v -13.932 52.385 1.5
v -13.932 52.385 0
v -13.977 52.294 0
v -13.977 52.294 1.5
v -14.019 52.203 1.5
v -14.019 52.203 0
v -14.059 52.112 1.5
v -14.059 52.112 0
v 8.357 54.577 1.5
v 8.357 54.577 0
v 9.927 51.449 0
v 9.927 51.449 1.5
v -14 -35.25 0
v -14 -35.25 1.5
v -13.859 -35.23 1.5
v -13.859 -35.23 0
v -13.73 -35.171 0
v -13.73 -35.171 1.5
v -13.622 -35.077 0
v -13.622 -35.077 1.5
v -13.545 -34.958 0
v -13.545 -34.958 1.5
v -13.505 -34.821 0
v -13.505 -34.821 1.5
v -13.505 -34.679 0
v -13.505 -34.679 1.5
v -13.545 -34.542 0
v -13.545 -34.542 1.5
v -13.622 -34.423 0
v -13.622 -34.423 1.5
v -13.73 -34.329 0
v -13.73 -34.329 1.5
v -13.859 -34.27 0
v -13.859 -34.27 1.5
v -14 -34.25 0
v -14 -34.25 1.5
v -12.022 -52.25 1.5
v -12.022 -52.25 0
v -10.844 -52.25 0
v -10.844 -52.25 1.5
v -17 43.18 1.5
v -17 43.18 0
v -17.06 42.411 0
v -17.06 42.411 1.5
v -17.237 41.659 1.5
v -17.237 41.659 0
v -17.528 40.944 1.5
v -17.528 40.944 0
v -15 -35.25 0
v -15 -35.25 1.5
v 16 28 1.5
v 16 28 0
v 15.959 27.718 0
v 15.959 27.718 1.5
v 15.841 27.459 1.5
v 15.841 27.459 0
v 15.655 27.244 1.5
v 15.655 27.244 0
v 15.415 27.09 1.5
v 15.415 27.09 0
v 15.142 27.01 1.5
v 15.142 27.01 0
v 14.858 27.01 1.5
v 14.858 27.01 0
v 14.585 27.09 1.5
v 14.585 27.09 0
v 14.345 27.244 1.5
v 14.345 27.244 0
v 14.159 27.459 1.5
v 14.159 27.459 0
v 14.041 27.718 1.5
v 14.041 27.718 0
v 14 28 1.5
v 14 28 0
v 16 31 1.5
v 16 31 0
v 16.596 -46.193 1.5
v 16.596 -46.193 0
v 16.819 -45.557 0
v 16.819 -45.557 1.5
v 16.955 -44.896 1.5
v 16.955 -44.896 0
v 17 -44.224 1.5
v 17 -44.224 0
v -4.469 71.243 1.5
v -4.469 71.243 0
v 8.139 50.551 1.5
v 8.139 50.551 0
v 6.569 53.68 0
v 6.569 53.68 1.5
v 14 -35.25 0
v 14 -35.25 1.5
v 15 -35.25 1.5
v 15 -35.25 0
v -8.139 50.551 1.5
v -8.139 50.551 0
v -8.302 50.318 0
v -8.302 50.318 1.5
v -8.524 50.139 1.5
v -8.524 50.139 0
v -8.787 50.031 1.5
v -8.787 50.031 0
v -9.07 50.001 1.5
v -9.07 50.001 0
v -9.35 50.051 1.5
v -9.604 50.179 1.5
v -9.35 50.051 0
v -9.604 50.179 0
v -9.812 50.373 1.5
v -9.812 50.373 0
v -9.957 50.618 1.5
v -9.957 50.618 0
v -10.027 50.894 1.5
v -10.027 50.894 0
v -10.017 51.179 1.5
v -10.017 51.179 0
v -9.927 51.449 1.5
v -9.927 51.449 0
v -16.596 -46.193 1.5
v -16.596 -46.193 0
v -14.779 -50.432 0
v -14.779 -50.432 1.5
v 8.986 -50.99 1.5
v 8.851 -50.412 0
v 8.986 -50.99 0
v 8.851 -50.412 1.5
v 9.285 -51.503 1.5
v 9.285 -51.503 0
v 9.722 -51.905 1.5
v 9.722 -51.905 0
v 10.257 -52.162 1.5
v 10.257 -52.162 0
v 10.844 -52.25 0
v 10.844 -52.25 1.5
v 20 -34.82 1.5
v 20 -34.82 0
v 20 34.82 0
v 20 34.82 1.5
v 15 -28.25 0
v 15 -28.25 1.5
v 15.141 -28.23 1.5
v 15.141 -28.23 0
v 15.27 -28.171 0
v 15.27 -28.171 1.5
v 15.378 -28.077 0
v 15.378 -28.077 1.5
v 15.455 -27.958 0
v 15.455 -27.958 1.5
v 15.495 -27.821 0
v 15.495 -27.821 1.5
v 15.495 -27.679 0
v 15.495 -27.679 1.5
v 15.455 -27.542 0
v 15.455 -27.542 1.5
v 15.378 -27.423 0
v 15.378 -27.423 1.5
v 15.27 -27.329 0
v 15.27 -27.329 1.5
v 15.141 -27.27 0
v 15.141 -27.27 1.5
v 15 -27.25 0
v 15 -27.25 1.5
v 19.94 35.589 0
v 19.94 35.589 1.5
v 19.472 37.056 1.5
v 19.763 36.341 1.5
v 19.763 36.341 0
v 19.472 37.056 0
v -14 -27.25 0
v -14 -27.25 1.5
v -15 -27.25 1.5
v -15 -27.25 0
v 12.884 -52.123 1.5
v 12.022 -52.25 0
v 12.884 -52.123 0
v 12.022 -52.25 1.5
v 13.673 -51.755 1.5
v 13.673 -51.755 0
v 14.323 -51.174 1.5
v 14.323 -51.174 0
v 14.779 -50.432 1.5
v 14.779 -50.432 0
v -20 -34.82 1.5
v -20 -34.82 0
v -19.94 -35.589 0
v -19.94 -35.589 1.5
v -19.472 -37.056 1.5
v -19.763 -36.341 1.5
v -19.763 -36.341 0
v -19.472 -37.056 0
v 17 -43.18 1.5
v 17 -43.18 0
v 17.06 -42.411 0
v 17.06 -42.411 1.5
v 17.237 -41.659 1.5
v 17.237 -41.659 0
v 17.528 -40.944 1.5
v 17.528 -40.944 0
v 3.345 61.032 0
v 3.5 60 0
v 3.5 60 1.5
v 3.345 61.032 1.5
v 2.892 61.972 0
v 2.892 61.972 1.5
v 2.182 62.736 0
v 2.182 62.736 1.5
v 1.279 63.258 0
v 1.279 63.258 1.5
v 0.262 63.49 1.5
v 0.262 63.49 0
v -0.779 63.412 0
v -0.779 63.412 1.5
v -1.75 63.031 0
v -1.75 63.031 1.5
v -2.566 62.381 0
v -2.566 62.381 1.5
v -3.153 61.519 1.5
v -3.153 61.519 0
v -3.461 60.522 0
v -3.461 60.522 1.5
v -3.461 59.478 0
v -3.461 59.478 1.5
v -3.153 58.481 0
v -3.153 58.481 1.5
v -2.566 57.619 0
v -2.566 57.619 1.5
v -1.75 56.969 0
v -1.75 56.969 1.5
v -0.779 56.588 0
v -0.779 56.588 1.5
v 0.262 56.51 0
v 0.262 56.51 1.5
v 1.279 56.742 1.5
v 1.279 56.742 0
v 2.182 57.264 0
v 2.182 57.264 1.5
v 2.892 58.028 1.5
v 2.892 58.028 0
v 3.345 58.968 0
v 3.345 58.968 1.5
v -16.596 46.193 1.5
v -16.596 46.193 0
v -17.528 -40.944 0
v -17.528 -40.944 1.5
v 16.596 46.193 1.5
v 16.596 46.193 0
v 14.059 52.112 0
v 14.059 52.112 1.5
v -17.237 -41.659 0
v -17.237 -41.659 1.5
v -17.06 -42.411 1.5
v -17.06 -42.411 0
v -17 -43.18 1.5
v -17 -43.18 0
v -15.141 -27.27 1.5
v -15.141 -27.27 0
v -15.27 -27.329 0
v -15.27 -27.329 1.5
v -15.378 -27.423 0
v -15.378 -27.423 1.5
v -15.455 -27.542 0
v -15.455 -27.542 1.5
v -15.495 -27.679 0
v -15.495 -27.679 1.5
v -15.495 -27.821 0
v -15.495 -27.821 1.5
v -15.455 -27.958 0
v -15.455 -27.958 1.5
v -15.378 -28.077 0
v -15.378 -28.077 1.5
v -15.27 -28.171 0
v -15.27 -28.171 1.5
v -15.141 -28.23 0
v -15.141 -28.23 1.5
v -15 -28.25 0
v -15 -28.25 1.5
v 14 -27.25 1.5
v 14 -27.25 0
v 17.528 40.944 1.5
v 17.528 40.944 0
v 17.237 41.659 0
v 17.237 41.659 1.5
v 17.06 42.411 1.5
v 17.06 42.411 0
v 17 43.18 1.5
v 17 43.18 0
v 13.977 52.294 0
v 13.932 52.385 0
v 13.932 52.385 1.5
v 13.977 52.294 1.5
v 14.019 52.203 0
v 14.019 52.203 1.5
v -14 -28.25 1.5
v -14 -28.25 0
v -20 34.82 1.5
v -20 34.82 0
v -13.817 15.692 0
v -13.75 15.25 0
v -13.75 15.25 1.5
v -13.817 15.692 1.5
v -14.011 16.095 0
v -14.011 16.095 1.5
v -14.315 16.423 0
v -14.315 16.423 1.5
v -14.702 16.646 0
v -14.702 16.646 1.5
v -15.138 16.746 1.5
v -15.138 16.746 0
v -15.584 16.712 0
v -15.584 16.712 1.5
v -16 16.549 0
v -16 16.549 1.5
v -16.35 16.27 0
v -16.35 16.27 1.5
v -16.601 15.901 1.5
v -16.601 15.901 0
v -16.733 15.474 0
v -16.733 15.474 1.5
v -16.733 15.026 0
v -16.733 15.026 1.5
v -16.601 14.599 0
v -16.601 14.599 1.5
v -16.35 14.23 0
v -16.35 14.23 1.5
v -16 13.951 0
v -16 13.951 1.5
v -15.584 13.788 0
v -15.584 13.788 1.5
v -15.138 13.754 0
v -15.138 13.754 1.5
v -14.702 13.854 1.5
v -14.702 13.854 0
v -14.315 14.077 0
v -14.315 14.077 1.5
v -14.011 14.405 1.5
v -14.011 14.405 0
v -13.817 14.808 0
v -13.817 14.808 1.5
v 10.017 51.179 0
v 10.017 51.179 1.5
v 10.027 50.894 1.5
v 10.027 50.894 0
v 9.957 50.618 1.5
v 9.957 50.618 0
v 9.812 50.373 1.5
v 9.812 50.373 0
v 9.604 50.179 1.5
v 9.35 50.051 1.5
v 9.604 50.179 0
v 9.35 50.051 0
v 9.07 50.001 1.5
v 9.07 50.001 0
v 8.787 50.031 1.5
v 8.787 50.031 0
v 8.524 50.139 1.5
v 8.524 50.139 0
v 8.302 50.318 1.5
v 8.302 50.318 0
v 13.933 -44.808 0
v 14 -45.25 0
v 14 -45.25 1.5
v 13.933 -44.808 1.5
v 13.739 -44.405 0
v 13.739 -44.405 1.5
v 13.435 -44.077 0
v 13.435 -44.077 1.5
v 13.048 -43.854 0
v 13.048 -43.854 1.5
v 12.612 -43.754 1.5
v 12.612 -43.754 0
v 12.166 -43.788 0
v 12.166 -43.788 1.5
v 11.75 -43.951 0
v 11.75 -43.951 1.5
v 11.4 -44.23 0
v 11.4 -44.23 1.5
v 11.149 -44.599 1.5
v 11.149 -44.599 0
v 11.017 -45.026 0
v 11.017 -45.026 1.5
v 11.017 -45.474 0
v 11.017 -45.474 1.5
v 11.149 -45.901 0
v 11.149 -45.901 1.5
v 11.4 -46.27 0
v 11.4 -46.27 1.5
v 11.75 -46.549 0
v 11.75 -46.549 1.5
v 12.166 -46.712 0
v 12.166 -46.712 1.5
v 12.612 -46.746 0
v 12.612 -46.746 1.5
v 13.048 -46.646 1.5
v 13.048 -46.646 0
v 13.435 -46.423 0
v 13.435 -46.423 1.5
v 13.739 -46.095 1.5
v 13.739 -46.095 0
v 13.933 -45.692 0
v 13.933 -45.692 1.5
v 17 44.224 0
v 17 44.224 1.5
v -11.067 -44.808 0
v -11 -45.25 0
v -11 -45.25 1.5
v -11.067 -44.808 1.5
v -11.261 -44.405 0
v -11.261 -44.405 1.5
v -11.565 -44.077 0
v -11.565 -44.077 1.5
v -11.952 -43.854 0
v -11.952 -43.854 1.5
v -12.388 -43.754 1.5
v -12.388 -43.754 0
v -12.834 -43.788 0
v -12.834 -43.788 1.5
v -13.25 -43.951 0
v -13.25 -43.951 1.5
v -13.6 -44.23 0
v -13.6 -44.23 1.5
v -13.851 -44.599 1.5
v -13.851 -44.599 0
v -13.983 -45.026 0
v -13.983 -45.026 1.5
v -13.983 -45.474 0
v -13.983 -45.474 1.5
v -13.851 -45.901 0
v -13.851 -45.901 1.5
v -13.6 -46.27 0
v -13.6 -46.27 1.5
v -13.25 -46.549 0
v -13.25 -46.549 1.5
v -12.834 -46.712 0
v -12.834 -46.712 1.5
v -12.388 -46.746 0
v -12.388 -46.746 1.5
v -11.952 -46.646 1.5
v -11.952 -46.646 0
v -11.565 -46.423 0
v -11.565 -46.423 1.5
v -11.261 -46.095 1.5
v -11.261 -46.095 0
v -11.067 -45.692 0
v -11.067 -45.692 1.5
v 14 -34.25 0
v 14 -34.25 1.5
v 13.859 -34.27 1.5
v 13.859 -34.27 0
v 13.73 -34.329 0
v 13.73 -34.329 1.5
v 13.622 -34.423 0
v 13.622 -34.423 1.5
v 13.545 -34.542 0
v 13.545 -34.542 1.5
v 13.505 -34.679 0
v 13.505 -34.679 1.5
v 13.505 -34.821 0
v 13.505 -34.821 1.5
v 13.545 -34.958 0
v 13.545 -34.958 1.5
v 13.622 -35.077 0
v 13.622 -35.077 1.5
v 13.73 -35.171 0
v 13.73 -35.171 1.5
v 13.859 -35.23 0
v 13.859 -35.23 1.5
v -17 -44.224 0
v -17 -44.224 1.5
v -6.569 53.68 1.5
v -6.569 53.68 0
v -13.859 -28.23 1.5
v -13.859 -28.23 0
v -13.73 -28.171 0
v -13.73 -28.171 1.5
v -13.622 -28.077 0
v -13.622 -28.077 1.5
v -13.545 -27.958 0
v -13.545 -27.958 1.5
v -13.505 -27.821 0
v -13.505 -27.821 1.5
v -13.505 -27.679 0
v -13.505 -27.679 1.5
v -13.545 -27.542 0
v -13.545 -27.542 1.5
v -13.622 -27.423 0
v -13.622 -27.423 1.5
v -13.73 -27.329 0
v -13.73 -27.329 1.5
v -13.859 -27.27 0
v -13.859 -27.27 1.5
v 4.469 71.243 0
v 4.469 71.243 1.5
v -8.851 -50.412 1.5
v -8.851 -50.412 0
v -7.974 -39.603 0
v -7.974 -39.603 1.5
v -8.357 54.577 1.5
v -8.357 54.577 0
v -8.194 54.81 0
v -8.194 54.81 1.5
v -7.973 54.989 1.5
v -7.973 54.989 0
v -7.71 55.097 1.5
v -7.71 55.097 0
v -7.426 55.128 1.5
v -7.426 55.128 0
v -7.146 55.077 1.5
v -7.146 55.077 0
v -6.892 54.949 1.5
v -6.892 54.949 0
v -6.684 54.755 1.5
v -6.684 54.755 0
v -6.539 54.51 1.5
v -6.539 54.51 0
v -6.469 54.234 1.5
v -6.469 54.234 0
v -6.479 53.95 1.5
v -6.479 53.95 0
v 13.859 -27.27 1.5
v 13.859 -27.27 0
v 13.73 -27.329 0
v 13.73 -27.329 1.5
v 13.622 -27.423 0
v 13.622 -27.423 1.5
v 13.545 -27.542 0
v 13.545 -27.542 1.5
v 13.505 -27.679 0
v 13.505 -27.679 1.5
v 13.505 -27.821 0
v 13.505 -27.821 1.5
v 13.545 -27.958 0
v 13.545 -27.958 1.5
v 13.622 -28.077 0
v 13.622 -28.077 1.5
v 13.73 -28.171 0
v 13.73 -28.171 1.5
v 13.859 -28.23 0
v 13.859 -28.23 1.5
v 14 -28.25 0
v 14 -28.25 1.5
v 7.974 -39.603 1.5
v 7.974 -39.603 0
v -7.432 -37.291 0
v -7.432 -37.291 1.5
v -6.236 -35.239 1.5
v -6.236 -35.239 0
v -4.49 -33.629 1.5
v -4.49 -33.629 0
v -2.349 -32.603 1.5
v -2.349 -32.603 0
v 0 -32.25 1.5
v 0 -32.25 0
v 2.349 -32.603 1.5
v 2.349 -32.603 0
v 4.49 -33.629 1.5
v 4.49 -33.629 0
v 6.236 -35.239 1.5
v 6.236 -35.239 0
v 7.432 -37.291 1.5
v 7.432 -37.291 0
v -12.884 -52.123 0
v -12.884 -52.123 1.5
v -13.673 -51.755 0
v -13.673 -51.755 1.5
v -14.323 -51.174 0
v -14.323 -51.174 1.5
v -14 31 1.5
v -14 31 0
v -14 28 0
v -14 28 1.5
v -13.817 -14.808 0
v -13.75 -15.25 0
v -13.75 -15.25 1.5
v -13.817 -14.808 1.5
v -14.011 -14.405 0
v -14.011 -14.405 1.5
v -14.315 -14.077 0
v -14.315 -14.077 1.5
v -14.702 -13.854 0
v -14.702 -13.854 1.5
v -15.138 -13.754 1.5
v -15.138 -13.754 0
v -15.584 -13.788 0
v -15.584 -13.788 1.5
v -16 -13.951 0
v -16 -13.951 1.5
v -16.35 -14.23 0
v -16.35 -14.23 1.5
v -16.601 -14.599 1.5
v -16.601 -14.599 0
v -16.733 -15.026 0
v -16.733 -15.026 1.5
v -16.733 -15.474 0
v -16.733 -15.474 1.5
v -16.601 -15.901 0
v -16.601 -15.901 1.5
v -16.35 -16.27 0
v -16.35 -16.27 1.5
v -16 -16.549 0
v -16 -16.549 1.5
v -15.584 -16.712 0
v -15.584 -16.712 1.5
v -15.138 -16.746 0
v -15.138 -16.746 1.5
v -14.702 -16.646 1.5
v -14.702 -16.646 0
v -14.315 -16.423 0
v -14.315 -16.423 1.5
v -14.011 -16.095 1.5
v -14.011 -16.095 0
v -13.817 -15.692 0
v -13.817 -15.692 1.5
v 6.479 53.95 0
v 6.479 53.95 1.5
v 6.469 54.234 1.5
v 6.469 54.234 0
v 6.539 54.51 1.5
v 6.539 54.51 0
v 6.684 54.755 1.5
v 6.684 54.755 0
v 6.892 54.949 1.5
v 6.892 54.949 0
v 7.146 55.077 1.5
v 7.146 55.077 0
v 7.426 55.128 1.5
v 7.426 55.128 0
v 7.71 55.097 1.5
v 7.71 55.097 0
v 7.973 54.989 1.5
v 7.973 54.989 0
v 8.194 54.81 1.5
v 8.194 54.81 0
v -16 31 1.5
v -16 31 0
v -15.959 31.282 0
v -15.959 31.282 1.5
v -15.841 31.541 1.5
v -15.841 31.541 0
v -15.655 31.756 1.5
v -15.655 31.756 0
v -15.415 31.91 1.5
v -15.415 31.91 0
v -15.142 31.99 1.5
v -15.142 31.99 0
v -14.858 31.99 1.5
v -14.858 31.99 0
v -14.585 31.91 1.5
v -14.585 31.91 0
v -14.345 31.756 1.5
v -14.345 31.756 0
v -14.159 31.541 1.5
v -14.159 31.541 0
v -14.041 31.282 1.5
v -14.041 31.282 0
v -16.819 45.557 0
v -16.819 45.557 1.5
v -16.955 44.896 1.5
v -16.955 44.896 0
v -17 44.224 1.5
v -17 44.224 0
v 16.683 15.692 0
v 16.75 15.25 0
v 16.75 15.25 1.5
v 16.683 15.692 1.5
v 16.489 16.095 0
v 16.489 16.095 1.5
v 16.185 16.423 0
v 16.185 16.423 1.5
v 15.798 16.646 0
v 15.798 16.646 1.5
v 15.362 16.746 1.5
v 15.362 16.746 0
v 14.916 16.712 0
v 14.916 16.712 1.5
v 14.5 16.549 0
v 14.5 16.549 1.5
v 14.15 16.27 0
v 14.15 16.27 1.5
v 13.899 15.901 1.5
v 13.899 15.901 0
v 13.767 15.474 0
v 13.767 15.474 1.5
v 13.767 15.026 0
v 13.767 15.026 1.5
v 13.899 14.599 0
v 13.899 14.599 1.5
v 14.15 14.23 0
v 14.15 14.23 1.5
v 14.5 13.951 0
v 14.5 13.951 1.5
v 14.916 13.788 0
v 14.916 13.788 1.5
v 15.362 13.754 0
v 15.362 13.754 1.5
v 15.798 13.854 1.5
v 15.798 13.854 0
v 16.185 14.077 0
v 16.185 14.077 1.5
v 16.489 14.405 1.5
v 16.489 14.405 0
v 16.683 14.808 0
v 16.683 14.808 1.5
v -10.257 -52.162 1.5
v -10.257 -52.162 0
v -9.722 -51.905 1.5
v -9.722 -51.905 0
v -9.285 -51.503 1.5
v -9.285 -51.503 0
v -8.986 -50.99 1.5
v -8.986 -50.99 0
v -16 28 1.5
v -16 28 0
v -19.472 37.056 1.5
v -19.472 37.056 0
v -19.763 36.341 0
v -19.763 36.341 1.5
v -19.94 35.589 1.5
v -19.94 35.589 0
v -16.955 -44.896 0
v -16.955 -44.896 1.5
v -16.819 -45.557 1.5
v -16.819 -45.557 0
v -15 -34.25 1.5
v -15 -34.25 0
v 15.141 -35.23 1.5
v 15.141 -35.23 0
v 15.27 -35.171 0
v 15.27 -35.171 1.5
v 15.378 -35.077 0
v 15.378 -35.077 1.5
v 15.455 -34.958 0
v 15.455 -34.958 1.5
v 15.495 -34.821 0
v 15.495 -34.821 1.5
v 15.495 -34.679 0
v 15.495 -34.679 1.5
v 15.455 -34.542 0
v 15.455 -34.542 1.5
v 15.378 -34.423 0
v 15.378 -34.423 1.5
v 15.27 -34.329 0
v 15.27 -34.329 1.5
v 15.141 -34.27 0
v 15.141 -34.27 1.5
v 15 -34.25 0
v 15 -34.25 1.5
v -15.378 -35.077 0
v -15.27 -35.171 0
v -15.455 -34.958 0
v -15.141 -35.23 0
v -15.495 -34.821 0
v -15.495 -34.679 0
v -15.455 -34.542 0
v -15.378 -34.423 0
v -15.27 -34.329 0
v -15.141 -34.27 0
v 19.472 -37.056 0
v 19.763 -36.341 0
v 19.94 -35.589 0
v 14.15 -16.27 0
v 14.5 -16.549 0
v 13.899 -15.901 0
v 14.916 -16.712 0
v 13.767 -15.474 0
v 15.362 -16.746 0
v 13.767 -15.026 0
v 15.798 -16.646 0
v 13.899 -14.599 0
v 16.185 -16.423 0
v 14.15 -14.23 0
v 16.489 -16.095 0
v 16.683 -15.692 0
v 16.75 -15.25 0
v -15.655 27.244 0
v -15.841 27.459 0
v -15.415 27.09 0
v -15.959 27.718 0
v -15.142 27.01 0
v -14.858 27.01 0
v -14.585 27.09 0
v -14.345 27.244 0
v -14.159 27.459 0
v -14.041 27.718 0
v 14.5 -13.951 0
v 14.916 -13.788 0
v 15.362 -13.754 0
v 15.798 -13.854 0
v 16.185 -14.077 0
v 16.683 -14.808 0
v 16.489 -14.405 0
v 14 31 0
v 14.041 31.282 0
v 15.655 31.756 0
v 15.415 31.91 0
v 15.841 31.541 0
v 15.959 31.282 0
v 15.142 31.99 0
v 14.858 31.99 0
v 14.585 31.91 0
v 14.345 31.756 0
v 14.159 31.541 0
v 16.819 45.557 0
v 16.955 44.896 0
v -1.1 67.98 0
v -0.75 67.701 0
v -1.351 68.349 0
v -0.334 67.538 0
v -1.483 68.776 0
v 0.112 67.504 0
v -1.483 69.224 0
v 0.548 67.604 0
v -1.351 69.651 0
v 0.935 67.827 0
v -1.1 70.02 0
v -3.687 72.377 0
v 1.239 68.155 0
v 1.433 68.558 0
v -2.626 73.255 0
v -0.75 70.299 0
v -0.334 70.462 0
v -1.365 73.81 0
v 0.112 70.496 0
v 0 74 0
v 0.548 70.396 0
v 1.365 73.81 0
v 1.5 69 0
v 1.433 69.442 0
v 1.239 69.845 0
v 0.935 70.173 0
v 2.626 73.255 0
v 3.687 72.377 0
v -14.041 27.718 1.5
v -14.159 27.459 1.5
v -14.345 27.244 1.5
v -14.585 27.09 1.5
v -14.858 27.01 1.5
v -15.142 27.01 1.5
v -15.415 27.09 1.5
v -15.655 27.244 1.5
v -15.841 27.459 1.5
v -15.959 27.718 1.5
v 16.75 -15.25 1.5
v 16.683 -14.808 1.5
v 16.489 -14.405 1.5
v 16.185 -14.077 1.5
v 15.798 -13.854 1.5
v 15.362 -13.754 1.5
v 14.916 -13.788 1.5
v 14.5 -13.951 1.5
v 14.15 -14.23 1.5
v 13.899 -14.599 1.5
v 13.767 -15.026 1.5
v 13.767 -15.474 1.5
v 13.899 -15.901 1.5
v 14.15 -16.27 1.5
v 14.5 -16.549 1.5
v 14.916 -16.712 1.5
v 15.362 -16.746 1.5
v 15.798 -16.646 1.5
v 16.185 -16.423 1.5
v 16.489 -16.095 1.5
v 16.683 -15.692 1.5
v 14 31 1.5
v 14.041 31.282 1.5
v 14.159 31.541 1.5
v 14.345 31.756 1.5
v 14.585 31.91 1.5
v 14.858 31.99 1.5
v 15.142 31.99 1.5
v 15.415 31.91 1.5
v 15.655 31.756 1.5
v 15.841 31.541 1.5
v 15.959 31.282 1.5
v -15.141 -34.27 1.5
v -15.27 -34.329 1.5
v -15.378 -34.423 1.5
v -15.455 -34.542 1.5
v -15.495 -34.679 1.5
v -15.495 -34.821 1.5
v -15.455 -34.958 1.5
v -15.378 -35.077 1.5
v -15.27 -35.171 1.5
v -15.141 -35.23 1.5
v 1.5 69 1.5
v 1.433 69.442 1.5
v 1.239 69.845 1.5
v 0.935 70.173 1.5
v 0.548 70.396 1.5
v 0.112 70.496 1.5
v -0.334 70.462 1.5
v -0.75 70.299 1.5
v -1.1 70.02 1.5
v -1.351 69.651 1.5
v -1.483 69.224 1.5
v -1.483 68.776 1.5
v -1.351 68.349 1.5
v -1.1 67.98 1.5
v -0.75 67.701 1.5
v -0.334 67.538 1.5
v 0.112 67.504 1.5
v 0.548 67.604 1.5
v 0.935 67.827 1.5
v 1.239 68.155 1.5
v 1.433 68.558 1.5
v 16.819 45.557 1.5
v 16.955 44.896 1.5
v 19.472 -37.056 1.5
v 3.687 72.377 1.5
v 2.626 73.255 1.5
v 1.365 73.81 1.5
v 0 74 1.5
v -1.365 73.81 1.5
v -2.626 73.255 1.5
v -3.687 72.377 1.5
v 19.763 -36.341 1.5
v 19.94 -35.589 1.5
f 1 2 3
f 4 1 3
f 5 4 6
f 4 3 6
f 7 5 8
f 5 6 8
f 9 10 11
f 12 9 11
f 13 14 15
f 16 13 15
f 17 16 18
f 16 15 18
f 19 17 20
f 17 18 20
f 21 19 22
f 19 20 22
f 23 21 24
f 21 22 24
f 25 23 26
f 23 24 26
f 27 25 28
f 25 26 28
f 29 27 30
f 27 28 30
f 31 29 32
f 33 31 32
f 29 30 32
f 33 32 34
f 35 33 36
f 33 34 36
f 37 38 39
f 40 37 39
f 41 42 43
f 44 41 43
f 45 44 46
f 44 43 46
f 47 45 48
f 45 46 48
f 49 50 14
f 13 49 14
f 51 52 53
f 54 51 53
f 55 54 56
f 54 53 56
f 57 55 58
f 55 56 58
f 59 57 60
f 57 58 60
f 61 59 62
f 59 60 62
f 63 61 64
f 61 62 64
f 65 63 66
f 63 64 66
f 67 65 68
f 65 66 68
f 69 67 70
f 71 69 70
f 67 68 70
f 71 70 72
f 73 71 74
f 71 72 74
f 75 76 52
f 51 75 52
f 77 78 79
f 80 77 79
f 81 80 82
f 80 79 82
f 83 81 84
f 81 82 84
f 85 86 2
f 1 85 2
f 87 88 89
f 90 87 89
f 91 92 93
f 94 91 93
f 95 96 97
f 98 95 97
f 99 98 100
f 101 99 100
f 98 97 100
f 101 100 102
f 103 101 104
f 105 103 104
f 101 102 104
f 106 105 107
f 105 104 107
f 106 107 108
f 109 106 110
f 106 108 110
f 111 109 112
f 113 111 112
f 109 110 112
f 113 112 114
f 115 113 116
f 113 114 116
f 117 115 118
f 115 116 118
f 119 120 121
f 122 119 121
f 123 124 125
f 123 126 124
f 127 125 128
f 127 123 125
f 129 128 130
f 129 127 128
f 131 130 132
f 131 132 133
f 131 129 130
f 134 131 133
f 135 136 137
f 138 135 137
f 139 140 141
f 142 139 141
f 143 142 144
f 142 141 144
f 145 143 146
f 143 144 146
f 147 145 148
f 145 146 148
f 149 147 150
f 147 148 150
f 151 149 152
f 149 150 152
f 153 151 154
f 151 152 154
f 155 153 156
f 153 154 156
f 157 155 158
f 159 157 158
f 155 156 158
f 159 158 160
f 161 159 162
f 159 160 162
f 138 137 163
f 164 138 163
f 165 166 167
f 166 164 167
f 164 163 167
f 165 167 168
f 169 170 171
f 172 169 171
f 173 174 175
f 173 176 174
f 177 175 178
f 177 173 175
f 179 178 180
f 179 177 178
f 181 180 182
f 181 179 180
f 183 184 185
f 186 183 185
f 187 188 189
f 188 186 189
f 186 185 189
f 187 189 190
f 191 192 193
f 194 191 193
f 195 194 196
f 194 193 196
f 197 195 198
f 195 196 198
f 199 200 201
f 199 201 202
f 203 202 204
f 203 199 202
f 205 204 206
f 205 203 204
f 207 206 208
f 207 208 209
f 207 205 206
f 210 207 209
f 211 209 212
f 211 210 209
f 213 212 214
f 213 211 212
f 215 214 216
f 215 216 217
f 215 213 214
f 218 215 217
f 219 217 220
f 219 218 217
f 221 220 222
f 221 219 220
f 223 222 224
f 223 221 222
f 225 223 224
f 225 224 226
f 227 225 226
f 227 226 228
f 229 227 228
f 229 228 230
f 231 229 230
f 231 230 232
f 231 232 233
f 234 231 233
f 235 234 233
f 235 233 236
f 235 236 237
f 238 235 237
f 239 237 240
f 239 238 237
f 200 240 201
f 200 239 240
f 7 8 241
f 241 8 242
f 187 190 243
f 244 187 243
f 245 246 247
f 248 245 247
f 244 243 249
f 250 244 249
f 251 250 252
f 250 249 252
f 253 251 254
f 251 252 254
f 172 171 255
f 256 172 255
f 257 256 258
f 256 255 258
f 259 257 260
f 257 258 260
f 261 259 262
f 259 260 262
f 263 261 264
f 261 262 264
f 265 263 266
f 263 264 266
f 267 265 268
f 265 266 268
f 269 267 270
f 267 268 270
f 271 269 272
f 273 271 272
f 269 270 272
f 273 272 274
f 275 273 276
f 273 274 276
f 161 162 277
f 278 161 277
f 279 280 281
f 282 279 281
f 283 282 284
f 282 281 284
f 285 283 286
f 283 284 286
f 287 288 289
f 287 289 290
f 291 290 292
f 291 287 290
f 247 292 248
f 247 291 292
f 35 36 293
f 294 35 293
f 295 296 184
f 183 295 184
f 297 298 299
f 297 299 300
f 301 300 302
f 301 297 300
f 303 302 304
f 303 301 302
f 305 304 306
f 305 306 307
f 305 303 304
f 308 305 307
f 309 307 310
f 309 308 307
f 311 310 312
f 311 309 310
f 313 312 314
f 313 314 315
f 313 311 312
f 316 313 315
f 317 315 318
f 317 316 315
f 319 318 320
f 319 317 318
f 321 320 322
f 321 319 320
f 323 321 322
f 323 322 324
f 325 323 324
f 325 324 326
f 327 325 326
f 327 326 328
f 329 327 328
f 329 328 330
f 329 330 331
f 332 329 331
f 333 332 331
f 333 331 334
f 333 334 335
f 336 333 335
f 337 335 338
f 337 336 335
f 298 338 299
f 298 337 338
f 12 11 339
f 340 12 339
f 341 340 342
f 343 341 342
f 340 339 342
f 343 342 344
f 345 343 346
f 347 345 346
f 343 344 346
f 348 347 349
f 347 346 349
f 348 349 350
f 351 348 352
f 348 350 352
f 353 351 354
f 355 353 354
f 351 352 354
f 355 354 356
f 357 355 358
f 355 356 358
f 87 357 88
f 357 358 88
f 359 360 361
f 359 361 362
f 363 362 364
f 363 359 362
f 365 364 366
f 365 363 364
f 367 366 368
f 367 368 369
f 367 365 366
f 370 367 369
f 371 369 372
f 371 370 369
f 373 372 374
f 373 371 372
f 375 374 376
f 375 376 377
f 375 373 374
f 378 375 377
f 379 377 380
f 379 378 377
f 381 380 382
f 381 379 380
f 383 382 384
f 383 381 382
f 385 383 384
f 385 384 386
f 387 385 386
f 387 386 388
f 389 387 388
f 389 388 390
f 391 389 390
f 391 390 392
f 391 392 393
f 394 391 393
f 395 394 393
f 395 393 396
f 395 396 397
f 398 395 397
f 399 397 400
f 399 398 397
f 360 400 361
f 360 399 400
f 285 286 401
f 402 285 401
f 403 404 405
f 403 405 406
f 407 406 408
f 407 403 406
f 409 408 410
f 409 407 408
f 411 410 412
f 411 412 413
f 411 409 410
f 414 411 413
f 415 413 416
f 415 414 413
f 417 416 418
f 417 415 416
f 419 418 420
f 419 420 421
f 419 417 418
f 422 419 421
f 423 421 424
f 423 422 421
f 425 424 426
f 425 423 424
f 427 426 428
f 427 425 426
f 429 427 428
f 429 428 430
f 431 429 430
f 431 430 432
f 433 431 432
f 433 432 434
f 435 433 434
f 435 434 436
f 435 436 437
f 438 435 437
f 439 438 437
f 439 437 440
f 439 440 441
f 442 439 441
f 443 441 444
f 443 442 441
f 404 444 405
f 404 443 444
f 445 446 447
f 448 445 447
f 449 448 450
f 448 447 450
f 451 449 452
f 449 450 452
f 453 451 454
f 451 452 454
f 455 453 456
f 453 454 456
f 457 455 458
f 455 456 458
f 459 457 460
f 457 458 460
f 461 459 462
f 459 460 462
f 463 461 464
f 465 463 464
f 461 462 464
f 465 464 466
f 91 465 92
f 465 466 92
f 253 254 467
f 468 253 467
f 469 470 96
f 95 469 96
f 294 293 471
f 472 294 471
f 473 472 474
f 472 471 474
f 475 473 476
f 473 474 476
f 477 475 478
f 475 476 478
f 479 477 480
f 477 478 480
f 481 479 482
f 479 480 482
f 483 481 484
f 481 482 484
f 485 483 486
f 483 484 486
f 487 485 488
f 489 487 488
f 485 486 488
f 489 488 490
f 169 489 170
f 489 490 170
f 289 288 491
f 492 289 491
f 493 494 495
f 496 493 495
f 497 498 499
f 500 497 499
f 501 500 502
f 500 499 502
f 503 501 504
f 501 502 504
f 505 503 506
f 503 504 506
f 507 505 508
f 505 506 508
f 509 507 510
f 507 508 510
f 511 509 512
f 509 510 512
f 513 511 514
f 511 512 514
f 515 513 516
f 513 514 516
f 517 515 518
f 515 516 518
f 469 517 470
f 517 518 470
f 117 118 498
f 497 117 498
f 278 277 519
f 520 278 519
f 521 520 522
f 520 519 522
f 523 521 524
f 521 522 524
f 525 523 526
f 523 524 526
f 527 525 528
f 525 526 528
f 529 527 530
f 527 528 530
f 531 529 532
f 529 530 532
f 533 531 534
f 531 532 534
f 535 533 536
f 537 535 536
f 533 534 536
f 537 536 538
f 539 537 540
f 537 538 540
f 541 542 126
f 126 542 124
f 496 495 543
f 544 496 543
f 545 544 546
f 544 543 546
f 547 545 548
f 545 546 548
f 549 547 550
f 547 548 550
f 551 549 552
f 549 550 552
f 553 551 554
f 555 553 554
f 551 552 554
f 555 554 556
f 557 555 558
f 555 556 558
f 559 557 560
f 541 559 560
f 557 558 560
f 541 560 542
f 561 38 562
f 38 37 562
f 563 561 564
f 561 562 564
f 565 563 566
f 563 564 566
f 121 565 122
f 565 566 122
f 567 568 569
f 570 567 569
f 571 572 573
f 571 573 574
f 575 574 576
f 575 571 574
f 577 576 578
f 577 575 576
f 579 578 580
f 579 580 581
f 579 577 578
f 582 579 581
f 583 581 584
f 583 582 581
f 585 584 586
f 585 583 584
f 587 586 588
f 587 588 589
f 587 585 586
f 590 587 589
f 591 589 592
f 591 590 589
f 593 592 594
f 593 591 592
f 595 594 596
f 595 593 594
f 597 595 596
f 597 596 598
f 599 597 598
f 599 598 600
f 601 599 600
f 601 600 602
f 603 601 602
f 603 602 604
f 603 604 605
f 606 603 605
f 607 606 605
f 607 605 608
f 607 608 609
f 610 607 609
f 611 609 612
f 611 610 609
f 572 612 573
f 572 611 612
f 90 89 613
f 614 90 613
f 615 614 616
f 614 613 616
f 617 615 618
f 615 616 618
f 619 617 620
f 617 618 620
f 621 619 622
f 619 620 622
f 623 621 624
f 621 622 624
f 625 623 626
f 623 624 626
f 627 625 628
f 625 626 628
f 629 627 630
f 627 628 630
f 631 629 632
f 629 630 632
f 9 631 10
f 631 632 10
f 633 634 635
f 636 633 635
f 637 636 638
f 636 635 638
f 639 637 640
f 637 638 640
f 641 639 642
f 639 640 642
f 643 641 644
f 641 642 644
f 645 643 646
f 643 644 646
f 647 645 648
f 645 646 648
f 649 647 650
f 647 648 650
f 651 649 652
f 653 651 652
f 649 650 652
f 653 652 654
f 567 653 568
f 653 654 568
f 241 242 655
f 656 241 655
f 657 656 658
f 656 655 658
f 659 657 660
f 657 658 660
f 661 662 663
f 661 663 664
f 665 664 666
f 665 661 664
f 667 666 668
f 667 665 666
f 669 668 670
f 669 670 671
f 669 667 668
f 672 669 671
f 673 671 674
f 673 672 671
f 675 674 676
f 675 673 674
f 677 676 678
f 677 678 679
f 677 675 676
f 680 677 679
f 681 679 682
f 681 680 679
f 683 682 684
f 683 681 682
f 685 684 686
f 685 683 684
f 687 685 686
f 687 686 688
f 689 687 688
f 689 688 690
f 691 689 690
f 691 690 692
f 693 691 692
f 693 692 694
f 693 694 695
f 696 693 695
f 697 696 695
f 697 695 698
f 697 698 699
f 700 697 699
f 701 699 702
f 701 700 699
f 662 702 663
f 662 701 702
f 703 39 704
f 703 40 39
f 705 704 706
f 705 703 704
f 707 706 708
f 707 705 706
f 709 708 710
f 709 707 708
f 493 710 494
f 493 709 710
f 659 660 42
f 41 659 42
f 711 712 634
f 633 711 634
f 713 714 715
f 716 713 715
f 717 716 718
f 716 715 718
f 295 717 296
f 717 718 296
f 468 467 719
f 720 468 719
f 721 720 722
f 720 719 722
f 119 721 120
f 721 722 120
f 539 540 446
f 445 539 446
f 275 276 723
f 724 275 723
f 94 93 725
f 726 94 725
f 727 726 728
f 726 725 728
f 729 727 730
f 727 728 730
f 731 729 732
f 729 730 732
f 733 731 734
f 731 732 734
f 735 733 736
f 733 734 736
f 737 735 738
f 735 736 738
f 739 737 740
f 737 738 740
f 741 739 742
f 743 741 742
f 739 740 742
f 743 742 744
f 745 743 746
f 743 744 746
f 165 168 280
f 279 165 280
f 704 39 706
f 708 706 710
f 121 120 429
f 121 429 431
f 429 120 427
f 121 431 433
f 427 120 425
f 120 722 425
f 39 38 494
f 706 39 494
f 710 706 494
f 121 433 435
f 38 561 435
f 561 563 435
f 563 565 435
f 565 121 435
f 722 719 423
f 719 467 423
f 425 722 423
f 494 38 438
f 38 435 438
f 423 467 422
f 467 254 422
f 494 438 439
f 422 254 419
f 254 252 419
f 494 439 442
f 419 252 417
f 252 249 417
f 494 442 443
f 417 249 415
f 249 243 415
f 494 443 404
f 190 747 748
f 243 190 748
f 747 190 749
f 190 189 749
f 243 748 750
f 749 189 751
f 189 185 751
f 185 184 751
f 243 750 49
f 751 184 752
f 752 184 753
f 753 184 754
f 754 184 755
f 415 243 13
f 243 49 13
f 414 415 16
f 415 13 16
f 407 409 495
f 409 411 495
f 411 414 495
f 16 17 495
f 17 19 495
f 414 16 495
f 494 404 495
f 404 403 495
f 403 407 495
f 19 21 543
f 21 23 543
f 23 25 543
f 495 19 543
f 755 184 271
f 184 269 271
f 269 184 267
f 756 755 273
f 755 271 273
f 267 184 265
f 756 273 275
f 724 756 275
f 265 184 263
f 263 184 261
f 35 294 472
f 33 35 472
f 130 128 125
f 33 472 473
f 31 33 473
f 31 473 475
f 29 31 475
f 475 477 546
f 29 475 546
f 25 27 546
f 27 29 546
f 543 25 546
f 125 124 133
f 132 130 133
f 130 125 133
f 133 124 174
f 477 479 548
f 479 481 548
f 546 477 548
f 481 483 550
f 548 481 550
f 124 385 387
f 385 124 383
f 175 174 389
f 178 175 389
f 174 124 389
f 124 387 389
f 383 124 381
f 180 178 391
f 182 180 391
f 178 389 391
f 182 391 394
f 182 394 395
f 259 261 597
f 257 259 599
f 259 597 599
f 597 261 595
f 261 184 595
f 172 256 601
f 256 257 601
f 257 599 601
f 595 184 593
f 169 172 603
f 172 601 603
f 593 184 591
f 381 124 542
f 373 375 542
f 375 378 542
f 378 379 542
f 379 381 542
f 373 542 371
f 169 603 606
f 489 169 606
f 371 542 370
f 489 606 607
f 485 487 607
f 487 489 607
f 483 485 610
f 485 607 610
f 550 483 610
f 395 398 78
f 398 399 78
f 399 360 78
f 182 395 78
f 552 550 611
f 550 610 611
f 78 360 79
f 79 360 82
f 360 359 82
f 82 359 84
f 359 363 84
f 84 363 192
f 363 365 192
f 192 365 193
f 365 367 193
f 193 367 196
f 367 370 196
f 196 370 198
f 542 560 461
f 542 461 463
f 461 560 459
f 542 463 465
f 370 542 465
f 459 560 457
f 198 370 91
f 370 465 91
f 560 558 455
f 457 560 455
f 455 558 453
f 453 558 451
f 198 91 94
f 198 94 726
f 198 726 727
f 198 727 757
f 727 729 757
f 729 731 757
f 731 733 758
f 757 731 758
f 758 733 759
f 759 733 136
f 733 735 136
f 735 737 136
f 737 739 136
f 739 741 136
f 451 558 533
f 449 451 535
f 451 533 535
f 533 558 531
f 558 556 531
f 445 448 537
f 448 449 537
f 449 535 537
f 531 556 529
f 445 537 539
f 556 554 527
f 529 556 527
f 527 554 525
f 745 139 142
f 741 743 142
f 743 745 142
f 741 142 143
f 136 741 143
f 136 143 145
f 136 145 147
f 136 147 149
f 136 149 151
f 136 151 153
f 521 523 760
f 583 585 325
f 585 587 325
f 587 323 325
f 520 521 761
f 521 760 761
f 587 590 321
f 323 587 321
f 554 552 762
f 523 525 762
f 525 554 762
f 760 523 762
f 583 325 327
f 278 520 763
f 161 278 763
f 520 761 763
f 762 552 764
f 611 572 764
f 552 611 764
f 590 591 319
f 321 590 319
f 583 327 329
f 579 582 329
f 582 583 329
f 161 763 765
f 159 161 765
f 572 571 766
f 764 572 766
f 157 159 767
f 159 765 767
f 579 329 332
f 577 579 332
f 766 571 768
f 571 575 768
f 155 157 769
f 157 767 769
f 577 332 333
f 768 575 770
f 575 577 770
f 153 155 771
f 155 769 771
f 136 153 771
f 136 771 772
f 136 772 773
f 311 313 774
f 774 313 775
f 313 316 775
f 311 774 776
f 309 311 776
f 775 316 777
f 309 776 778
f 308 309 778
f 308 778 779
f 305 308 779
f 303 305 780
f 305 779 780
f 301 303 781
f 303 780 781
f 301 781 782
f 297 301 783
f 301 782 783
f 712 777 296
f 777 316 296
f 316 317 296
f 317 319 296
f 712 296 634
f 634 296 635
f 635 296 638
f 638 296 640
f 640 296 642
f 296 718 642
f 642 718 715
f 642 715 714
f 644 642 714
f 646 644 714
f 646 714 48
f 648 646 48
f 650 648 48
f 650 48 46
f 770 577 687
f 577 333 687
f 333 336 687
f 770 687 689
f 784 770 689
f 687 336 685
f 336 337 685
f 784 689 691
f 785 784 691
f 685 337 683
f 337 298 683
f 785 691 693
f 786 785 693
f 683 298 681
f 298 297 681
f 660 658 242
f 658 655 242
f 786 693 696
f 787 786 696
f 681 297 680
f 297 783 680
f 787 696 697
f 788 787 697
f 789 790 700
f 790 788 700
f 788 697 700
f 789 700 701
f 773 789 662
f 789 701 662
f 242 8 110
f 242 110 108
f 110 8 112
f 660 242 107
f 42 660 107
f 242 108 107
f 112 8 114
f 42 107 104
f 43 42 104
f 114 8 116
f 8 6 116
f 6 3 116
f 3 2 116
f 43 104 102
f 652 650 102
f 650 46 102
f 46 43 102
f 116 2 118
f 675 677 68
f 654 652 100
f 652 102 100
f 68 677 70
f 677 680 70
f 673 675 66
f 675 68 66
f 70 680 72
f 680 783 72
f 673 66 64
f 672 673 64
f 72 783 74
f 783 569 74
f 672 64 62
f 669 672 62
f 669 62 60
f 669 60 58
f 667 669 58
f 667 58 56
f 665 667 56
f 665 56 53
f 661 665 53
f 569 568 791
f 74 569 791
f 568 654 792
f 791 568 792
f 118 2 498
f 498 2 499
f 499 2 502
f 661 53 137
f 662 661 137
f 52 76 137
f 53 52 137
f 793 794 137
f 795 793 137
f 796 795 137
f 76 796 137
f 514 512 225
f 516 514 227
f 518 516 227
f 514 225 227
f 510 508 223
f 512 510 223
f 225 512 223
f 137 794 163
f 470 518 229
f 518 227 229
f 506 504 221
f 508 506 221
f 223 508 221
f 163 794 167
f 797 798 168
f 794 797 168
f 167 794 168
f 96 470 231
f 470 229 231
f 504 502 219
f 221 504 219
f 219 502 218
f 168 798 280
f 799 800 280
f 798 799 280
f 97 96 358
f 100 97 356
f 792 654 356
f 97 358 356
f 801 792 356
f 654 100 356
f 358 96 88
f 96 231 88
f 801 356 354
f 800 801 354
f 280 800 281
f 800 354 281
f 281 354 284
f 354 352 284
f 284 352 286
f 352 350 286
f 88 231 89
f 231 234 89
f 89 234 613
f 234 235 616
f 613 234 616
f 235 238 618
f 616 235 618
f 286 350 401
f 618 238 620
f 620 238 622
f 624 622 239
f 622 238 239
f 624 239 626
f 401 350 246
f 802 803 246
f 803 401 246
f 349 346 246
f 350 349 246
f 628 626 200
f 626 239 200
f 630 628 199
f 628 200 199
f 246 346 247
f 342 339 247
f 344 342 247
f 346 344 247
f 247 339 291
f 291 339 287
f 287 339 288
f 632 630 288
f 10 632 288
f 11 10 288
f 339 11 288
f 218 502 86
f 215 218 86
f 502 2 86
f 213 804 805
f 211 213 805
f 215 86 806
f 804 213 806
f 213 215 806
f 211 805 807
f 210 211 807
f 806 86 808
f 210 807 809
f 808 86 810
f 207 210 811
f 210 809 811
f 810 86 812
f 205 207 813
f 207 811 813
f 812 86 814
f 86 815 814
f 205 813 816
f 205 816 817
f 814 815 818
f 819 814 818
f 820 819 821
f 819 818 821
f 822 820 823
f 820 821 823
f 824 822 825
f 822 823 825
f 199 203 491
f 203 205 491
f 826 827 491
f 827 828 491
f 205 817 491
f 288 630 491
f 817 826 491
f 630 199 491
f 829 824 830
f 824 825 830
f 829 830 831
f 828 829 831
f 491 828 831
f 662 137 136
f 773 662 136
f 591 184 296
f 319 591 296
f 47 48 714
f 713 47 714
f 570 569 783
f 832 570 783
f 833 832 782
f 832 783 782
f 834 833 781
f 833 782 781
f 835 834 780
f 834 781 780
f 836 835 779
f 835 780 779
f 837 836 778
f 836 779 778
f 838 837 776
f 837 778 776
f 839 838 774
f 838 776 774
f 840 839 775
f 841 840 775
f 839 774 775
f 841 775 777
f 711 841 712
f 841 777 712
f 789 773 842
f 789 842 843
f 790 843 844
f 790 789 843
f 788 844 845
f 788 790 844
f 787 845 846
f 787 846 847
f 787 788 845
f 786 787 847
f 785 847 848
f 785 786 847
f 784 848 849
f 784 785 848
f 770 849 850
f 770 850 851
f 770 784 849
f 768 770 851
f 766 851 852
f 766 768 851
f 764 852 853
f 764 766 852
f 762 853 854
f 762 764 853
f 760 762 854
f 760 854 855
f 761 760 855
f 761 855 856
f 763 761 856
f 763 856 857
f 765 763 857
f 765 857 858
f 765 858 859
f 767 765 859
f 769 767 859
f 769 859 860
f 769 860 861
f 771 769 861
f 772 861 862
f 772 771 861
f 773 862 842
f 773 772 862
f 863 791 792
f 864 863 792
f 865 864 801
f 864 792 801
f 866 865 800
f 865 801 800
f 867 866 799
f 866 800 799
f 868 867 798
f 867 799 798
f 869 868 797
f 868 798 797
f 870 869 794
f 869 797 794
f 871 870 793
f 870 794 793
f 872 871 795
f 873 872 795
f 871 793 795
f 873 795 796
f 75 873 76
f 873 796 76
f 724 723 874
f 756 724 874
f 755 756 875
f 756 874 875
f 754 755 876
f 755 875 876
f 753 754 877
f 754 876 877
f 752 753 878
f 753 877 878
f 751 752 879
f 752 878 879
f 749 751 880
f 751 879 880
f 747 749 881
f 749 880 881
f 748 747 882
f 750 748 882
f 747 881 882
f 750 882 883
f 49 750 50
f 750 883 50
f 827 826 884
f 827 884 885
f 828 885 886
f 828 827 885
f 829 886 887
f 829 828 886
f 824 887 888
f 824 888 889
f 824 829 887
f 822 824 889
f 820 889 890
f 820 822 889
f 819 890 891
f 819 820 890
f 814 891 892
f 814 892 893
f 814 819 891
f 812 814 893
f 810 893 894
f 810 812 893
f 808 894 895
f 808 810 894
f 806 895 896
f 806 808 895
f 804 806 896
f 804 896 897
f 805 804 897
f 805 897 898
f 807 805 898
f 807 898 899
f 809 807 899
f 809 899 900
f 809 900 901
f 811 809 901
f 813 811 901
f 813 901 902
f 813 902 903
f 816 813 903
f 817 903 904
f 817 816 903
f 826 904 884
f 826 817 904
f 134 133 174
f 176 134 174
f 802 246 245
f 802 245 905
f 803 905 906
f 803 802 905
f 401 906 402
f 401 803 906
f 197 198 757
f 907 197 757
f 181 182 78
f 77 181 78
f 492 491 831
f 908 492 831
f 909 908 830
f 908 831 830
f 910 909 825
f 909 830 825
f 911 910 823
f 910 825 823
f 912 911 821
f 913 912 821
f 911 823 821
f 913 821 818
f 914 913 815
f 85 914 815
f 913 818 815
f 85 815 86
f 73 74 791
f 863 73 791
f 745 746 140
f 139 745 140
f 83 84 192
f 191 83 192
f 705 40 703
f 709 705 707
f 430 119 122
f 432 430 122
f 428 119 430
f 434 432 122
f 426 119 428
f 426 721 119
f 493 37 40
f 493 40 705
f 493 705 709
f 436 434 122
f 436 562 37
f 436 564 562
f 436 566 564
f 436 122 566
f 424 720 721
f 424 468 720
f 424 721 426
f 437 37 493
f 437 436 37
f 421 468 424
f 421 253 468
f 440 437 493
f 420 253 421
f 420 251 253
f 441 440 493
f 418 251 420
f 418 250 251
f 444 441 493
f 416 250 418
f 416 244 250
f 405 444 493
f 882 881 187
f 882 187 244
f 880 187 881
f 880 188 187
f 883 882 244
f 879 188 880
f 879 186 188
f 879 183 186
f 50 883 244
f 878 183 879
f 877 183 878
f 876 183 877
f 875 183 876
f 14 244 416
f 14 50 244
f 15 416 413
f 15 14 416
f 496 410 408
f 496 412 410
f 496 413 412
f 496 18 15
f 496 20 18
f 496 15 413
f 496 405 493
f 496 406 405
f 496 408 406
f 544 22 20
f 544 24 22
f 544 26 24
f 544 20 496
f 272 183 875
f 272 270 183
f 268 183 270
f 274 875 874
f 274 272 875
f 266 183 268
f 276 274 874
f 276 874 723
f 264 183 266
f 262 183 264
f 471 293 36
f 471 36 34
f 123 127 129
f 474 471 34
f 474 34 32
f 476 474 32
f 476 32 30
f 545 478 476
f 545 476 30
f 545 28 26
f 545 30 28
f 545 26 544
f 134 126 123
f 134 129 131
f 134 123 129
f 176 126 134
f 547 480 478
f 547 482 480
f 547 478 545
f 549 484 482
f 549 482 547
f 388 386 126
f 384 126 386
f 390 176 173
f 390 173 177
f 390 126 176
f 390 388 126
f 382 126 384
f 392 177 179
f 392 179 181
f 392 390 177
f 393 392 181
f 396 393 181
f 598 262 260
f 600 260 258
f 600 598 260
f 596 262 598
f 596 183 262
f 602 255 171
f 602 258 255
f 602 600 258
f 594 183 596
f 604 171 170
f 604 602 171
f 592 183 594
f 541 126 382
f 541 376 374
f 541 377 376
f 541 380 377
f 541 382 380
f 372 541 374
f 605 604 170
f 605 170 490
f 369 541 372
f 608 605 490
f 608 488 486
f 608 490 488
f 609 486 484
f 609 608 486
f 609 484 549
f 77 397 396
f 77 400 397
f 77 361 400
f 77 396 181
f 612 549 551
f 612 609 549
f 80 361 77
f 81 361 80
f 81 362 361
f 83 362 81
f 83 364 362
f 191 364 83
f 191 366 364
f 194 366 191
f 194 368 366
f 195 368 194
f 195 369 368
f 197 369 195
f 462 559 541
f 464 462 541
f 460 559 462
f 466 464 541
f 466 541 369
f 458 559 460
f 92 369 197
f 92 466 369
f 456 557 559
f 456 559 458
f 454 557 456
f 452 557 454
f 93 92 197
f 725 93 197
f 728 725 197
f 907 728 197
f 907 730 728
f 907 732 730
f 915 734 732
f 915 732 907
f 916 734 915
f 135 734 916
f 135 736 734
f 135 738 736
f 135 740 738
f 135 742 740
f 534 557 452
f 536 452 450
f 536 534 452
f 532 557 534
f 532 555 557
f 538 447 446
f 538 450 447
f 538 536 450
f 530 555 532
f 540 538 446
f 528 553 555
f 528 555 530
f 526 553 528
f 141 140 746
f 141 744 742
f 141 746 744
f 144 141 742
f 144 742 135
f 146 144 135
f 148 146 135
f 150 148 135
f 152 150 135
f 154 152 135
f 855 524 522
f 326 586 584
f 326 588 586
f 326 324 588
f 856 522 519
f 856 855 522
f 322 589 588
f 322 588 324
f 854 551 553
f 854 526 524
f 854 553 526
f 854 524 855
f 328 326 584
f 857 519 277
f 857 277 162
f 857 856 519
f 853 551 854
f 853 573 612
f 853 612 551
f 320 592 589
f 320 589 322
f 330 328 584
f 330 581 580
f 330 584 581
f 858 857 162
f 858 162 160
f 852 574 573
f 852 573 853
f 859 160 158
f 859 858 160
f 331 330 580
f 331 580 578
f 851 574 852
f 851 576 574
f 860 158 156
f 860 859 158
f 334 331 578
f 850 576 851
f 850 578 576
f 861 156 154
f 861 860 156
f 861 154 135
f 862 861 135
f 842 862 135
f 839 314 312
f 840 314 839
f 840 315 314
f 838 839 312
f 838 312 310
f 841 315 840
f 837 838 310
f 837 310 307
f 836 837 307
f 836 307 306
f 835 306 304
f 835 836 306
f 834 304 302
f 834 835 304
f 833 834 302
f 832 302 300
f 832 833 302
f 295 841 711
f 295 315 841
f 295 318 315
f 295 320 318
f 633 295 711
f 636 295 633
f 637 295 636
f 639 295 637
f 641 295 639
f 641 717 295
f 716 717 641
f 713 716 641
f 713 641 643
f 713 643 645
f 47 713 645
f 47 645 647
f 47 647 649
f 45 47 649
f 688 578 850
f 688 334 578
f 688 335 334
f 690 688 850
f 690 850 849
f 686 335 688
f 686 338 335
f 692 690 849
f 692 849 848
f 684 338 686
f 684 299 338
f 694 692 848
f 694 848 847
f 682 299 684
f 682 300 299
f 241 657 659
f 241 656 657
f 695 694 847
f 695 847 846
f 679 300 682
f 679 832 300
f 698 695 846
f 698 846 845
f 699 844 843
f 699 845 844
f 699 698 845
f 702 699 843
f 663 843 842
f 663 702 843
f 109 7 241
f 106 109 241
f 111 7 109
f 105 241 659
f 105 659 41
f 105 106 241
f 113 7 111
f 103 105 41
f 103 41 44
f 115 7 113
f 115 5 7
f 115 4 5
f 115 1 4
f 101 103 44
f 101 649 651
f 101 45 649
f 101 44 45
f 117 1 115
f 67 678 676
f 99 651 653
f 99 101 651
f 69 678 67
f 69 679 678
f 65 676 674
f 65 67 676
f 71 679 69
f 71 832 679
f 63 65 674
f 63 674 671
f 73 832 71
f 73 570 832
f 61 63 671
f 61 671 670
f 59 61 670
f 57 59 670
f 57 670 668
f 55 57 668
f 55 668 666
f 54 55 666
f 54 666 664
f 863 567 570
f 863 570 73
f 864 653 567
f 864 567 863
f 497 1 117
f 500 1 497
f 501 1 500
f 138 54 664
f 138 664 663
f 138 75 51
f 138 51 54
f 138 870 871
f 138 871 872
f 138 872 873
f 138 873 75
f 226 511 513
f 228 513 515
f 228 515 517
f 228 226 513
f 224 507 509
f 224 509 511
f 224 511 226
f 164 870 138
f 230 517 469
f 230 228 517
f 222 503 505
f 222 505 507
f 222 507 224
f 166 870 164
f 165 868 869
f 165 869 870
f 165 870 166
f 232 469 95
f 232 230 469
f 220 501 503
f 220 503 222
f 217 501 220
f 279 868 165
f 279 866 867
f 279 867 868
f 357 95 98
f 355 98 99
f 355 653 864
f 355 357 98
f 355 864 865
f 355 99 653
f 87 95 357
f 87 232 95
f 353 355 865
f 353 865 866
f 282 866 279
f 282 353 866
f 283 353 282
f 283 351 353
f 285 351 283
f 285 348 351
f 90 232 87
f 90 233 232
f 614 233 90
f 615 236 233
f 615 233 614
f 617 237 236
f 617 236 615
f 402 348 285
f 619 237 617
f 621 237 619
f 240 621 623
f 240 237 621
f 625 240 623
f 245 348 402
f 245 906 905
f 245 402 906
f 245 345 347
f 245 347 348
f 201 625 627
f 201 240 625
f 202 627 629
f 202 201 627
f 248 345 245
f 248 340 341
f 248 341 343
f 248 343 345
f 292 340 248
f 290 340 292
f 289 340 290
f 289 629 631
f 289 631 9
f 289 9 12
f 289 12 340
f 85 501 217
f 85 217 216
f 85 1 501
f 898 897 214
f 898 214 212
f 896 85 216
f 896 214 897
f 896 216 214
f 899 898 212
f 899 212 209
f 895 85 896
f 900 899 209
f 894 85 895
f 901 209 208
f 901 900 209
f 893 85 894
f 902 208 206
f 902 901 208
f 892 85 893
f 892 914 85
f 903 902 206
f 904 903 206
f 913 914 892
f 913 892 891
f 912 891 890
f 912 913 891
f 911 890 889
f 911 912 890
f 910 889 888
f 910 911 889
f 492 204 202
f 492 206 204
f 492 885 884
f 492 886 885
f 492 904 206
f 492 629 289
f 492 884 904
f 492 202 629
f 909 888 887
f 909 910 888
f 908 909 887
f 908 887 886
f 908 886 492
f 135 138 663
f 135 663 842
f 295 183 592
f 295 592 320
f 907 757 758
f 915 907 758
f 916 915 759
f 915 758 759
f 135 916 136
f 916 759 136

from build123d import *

# Parameters (mm, degrees)
F0_R        = 1.5
F0_R_2      = 3.5
F1_DEPTH    = 1.5
F2_T1_DEPTH = 1.5
F2_T3_DEPTH = 6.6314425489
F2_T5_DEPTH = 7.4016994375
F2_T7_DEPTH = 2.253003807
F4_DEPTH    = 25
F5_R        = 2
F6_R        = 3


# Not quite as in the source:
# - a fillet or chamfer that OpenCascade refuses, or shapes differently, is made with other operations: its cross-section is extruded or revolved along the edge and cut away or added


with BuildPart() as f1:
    # F0 (on Top) → F1 (new body)
    with BuildSketch(Plane.XY):
        with BuildLine():
            Line((-17, 42), (-20, 36))
            Line((-20, 36), (-20, -36))
            Line((-20, -36), (-17, -42))
            Line((-17, -42), (-17, -45.25))
            Line((-17, -45.25), (-14, -52.25))
            Line((-14, -52.25), (-9, -52.25))
            Line((-9, -52.25), (-7.9737930839, -39.6029885204))
            ThreePointArc((-7.9737930839, -39.6029885204), (0, -32.25), (7.9737930839, -39.6029885204))
            Line((7.9737930839, -39.6029885204), (9, -52.25))
            Line((9, -52.25), (14, -52.25))
            Line((14, -52.25), (17, -45.25))
            Line((17, -45.25), (17, -42))
            Line((17, -42), (20, -36))
            Line((20, -36), (20, 36))
            Line((20, 36), (17, 42))
            Line((17, 42), (17, 45.25))
            Line((17, 45.25), (14, 52.25))
            Line((14, 52.25), (4.468852459, 71.2426229508))
            ThreePointArc((4.468852459, 71.2426229508), (0, 74), (-4.468852459, 71.2426229508))
            Line((-4.468852459, 71.2426229508), (-14, 52.25))
            Line((-14, 52.25), (-17, 45.25))
            Line((-17, 45.25), (-17, 42))
        make_face()
        with Locations((-12.5, -45.25)):
            Circle(F0_R, mode=Mode.SUBTRACT)
        with Locations((-15.25, -15.25)):
            Circle(F0_R, mode=Mode.SUBTRACT)
        with Locations((12.5, -45.25)):
            Circle(F0_R, mode=Mode.SUBTRACT)
        with Locations((15.25, -15.25)):
            Circle(F0_R, mode=Mode.SUBTRACT)
        with Locations((-15.25, 15.25)):
            Circle(F0_R, mode=Mode.SUBTRACT)
        with BuildLine():
            Line((-16, 28), (-16, 31))
            ThreePointArc((-16, 31), (-15, 32), (-14, 31))
            Line((-14, 31), (-14, 28))
            ThreePointArc((-14, 28), (-15, 27), (-16, 28))
        make_face(mode=Mode.SUBTRACT)
        with BuildLine():
            Line((-6.5694088498, 53.6796721311), (-8.1392449154, 50.5514754098))
            ThreePointArc((-8.1392449154, 50.5514754098), (-9.4815399974, 50.1062295082), (-9.926785899, 51.4485245902))
            Line((-9.926785899, 51.4485245902), (-8.3569498334, 54.5767213115))
            ThreePointArc((-8.3569498334, 54.5767213115), (-7.0146547515, 55.0219672131), (-6.5694088498, 53.6796721311))
        make_face(mode=Mode.SUBTRACT)
        with Locations((15.25, 15.25)):
            Circle(F0_R, mode=Mode.SUBTRACT)
        with BuildLine():
            ThreePointArc((16, 28), (15, 27), (14, 28))
            Line((14, 28), (14, 31))
            ThreePointArc((14, 31), (15, 32), (16, 31))
            Line((16, 31), (16, 28))
        make_face(mode=Mode.SUBTRACT)
        with BuildLine():
            ThreePointArc((9.926785899, 51.4485245902), (9.4815399974, 50.1062295082), (8.1392449154, 50.5514754098))
            Line((8.1392449154, 50.5514754098), (6.5694088498, 53.6796721311))
            ThreePointArc((6.5694088498, 53.6796721311), (7.0146547515, 55.0219672131), (8.3569498334, 54.5767213115))
            Line((8.3569498334, 54.5767213115), (9.926785899, 51.4485245902))
        make_face(mode=Mode.SUBTRACT)
        with Locations((0, 60)):
            Circle(F0_R_2, mode=Mode.SUBTRACT)
        with Locations((0, 69)):
            Circle(F0_R, mode=Mode.SUBTRACT)
    extrude(amount=F1_DEPTH)

    # F2: fillet of radius 5 on 14 edges, made by hand

    # F2_s2 → F2_t1 (join)
    with BuildSketch(Plane.XY):
        with BuildLine():
            ThreePointArc((-17, 43.1803398875), (-17.1337550527, 42.0315752848), (-17.527864045, 40.94427191))
            Line((-17.527864045, 40.94427191), (-17, 42))
            Line((-17, 42), (-17, 43.1803398875))
        make_face()
        with BuildLine():
            ThreePointArc((17.527864045, 40.94427191), (17.1337550527, 42.0315752848), (17, 43.1803398875))
            Line((17, 43.1803398875), (17, 42))
            Line((17, 42), (17.527864045, 40.94427191))
        make_face()
        with BuildLine():
            ThreePointArc((17, -43.1803398875), (17.1337550527, -42.0315752848), (17.527864045, -40.94427191))
            Line((17.527864045, -40.94427191), (17, -42))
            Line((17, -42), (17, -43.1803398875))
        make_face()
        with BuildLine():
            ThreePointArc((-17.527864045, -40.94427191), (-17.1337550527, -42.0315752848), (-17, -43.1803398875))
            Line((-17, -43.1803398875), (-17, -42))
            Line((-17, -42), (-17.527864045, -40.94427191))
        make_face()
    extrude(amount=F2_T1_DEPTH)

    # F2_s4 → F2_t3 (cut)
    with BuildSketch(Plane.XY.offset(-2.5657212744)):
        with BuildLine():
            ThreePointArc((16.5957251501, -46.1933079831), (16.897888614, -45.2290408516), (17, -44.2237114902))
            Line((17, -44.2237114902), (17, -45.25))
            Line((17, -45.25), (16.5957251501, -46.1933079831))
        make_face()
        with BuildLine():
            ThreePointArc((-16.5957251501, 46.1933079831), (-16.897888614, 45.2290408516), (-17, 44.2237114902))
            Line((-17, 44.2237114902), (-17, 45.25))
            Line((-17, 45.25), (-16.5957251501, 46.1933079831))
        make_face()
        with BuildLine():
            ThreePointArc((16.5957251501, 46.1933079831), (16.897888614, 45.2290408516), (17, 44.2237114902))
            Line((17, 44.2237114902), (17, 45.25))
            Line((17, 45.25), (16.5957251501, 46.1933079831))
        make_face()
        with BuildLine():
            ThreePointArc((-17, -44.2237114902), (-16.897888614, -45.2290408516), (-16.5957251501, -46.1933079831))
            Line((-16.5957251501, -46.1933079831), (-17, -45.25))
            Line((-17, -45.25), (-17, -44.2237114902))
        make_face()
    extrude(amount=F2_T3_DEPTH, mode=Mode.SUBTRACT)

    # F2_s6 → F2_t5 (cut)
    with BuildSketch(Plane.XY.offset(-2.9508497187)):
        with BuildLine():
            ThreePointArc((-19.472135955, 37.05572809), (-19.8662449473, 35.9684247152), (-20, 34.8196601125))
            Line((-20, 34.8196601125), (-20, 36))
            Line((-20, 36), (-19.472135955, 37.05572809))
        make_face()
        with BuildLine():
            ThreePointArc((20, 34.8196601125), (19.8662449473, 35.9684247152), (19.472135955, 37.05572809))
            Line((19.472135955, 37.05572809), (20, 36))
            Line((20, 36), (20, 34.8196601125))
        make_face()
        with BuildLine():
            ThreePointArc((19.472135955, -37.05572809), (19.8662449473, -35.9684247152), (20, -34.8196601125))
            Line((20, -34.8196601125), (20, -36))
            Line((20, -36), (19.472135955, -37.05572809))
        make_face()
        with BuildLine():
            ThreePointArc((-20, -34.8196601125), (-19.8662449473, -35.9684247152), (-19.472135955, -37.05572809))
            Line((-19.472135955, -37.05572809), (-20, -36))
            Line((-20, -36), (-20, -34.8196601125))
        make_face()
    extrude(amount=F2_T5_DEPTH, mode=Mode.SUBTRACT)

    # F2_s8 → F2_t7 (cut)
    with BuildSketch(Plane.XY.offset(-0.3765019035)):
        with BuildLine():
            ThreePointArc((-13.9324518552, 52.3846025166), (-13.9979436343, 52.2490444272), (-14.0593245463, 52.1115760587))
            Line((-14.0593245463, 52.1115760587), (-14, 52.25))
            Line((-14, 52.25), (-13.9324518552, 52.3846025166))
        make_face()
        with BuildLine():
            ThreePointArc((13.9324518552, 52.3846025166), (13.9979436343, 52.2490444272), (14.0593245463, 52.1115760587))
            Line((14.0593245463, 52.1115760587), (14, 52.25))
            Line((14, 52.25), (13.9324518552, 52.3846025166))
        make_face()
    extrude(amount=F2_T7_DEPTH, mode=Mode.SUBTRACT)

    # F3 (on face) → F4 (cut)
    with BuildSketch(Plane.XY.offset(1.5)):
        with BuildLine():
            Line((-14, -27.25), (-15, -27.25))
            ThreePointArc((-15, -27.25), (-15.5, -27.75), (-15, -28.25))
            Line((-15, -28.25), (-15, -34.25))
            ThreePointArc((-15, -34.25), (-15.5, -34.75), (-15, -35.25))
            Line((-15, -35.25), (-14, -35.25))
            ThreePointArc((-14, -35.25), (-13.5, -34.75), (-14, -34.25))
            Line((-14, -34.25), (-14, -28.25))
            ThreePointArc((-14, -28.25), (-13.5, -27.75), (-14, -27.25))
        make_face()
        with BuildLine():
            Line((14, -35.25), (15, -35.25))
            ThreePointArc((15, -35.25), (15.5, -34.75), (15, -34.25))
            Line((15, -34.25), (15, -28.25))
            ThreePointArc((15, -28.25), (15.5, -27.75), (15, -27.25))
            Line((15, -27.25), (14, -27.25))
            ThreePointArc((14, -27.25), (13.5, -27.75), (14, -28.25))
            Line((14, -28.25), (14, -34.25))
            ThreePointArc((14, -34.25), (13.5, -34.75), (14, -35.25))
        make_face()
    extrude(amount=-F4_DEPTH, mode=Mode.SUBTRACT)

    # F5
    f5_edges = [f1.edges().sort_by_distance(p)[0] for p in [
        (-9, -52.25, 0.75),
        (9, -52.25, 0.75),
    ]]
    fillet(f5_edges, radius=F5_R)

    # F6
    f6_edges = [f1.edges().sort_by_distance(p)[0] for p in [
        (-14, -52.25, 0.75),
        (14, -52.25, 0.75),
    ]]
    fillet(f6_edges, radius=F6_R)


solid = f1.part
